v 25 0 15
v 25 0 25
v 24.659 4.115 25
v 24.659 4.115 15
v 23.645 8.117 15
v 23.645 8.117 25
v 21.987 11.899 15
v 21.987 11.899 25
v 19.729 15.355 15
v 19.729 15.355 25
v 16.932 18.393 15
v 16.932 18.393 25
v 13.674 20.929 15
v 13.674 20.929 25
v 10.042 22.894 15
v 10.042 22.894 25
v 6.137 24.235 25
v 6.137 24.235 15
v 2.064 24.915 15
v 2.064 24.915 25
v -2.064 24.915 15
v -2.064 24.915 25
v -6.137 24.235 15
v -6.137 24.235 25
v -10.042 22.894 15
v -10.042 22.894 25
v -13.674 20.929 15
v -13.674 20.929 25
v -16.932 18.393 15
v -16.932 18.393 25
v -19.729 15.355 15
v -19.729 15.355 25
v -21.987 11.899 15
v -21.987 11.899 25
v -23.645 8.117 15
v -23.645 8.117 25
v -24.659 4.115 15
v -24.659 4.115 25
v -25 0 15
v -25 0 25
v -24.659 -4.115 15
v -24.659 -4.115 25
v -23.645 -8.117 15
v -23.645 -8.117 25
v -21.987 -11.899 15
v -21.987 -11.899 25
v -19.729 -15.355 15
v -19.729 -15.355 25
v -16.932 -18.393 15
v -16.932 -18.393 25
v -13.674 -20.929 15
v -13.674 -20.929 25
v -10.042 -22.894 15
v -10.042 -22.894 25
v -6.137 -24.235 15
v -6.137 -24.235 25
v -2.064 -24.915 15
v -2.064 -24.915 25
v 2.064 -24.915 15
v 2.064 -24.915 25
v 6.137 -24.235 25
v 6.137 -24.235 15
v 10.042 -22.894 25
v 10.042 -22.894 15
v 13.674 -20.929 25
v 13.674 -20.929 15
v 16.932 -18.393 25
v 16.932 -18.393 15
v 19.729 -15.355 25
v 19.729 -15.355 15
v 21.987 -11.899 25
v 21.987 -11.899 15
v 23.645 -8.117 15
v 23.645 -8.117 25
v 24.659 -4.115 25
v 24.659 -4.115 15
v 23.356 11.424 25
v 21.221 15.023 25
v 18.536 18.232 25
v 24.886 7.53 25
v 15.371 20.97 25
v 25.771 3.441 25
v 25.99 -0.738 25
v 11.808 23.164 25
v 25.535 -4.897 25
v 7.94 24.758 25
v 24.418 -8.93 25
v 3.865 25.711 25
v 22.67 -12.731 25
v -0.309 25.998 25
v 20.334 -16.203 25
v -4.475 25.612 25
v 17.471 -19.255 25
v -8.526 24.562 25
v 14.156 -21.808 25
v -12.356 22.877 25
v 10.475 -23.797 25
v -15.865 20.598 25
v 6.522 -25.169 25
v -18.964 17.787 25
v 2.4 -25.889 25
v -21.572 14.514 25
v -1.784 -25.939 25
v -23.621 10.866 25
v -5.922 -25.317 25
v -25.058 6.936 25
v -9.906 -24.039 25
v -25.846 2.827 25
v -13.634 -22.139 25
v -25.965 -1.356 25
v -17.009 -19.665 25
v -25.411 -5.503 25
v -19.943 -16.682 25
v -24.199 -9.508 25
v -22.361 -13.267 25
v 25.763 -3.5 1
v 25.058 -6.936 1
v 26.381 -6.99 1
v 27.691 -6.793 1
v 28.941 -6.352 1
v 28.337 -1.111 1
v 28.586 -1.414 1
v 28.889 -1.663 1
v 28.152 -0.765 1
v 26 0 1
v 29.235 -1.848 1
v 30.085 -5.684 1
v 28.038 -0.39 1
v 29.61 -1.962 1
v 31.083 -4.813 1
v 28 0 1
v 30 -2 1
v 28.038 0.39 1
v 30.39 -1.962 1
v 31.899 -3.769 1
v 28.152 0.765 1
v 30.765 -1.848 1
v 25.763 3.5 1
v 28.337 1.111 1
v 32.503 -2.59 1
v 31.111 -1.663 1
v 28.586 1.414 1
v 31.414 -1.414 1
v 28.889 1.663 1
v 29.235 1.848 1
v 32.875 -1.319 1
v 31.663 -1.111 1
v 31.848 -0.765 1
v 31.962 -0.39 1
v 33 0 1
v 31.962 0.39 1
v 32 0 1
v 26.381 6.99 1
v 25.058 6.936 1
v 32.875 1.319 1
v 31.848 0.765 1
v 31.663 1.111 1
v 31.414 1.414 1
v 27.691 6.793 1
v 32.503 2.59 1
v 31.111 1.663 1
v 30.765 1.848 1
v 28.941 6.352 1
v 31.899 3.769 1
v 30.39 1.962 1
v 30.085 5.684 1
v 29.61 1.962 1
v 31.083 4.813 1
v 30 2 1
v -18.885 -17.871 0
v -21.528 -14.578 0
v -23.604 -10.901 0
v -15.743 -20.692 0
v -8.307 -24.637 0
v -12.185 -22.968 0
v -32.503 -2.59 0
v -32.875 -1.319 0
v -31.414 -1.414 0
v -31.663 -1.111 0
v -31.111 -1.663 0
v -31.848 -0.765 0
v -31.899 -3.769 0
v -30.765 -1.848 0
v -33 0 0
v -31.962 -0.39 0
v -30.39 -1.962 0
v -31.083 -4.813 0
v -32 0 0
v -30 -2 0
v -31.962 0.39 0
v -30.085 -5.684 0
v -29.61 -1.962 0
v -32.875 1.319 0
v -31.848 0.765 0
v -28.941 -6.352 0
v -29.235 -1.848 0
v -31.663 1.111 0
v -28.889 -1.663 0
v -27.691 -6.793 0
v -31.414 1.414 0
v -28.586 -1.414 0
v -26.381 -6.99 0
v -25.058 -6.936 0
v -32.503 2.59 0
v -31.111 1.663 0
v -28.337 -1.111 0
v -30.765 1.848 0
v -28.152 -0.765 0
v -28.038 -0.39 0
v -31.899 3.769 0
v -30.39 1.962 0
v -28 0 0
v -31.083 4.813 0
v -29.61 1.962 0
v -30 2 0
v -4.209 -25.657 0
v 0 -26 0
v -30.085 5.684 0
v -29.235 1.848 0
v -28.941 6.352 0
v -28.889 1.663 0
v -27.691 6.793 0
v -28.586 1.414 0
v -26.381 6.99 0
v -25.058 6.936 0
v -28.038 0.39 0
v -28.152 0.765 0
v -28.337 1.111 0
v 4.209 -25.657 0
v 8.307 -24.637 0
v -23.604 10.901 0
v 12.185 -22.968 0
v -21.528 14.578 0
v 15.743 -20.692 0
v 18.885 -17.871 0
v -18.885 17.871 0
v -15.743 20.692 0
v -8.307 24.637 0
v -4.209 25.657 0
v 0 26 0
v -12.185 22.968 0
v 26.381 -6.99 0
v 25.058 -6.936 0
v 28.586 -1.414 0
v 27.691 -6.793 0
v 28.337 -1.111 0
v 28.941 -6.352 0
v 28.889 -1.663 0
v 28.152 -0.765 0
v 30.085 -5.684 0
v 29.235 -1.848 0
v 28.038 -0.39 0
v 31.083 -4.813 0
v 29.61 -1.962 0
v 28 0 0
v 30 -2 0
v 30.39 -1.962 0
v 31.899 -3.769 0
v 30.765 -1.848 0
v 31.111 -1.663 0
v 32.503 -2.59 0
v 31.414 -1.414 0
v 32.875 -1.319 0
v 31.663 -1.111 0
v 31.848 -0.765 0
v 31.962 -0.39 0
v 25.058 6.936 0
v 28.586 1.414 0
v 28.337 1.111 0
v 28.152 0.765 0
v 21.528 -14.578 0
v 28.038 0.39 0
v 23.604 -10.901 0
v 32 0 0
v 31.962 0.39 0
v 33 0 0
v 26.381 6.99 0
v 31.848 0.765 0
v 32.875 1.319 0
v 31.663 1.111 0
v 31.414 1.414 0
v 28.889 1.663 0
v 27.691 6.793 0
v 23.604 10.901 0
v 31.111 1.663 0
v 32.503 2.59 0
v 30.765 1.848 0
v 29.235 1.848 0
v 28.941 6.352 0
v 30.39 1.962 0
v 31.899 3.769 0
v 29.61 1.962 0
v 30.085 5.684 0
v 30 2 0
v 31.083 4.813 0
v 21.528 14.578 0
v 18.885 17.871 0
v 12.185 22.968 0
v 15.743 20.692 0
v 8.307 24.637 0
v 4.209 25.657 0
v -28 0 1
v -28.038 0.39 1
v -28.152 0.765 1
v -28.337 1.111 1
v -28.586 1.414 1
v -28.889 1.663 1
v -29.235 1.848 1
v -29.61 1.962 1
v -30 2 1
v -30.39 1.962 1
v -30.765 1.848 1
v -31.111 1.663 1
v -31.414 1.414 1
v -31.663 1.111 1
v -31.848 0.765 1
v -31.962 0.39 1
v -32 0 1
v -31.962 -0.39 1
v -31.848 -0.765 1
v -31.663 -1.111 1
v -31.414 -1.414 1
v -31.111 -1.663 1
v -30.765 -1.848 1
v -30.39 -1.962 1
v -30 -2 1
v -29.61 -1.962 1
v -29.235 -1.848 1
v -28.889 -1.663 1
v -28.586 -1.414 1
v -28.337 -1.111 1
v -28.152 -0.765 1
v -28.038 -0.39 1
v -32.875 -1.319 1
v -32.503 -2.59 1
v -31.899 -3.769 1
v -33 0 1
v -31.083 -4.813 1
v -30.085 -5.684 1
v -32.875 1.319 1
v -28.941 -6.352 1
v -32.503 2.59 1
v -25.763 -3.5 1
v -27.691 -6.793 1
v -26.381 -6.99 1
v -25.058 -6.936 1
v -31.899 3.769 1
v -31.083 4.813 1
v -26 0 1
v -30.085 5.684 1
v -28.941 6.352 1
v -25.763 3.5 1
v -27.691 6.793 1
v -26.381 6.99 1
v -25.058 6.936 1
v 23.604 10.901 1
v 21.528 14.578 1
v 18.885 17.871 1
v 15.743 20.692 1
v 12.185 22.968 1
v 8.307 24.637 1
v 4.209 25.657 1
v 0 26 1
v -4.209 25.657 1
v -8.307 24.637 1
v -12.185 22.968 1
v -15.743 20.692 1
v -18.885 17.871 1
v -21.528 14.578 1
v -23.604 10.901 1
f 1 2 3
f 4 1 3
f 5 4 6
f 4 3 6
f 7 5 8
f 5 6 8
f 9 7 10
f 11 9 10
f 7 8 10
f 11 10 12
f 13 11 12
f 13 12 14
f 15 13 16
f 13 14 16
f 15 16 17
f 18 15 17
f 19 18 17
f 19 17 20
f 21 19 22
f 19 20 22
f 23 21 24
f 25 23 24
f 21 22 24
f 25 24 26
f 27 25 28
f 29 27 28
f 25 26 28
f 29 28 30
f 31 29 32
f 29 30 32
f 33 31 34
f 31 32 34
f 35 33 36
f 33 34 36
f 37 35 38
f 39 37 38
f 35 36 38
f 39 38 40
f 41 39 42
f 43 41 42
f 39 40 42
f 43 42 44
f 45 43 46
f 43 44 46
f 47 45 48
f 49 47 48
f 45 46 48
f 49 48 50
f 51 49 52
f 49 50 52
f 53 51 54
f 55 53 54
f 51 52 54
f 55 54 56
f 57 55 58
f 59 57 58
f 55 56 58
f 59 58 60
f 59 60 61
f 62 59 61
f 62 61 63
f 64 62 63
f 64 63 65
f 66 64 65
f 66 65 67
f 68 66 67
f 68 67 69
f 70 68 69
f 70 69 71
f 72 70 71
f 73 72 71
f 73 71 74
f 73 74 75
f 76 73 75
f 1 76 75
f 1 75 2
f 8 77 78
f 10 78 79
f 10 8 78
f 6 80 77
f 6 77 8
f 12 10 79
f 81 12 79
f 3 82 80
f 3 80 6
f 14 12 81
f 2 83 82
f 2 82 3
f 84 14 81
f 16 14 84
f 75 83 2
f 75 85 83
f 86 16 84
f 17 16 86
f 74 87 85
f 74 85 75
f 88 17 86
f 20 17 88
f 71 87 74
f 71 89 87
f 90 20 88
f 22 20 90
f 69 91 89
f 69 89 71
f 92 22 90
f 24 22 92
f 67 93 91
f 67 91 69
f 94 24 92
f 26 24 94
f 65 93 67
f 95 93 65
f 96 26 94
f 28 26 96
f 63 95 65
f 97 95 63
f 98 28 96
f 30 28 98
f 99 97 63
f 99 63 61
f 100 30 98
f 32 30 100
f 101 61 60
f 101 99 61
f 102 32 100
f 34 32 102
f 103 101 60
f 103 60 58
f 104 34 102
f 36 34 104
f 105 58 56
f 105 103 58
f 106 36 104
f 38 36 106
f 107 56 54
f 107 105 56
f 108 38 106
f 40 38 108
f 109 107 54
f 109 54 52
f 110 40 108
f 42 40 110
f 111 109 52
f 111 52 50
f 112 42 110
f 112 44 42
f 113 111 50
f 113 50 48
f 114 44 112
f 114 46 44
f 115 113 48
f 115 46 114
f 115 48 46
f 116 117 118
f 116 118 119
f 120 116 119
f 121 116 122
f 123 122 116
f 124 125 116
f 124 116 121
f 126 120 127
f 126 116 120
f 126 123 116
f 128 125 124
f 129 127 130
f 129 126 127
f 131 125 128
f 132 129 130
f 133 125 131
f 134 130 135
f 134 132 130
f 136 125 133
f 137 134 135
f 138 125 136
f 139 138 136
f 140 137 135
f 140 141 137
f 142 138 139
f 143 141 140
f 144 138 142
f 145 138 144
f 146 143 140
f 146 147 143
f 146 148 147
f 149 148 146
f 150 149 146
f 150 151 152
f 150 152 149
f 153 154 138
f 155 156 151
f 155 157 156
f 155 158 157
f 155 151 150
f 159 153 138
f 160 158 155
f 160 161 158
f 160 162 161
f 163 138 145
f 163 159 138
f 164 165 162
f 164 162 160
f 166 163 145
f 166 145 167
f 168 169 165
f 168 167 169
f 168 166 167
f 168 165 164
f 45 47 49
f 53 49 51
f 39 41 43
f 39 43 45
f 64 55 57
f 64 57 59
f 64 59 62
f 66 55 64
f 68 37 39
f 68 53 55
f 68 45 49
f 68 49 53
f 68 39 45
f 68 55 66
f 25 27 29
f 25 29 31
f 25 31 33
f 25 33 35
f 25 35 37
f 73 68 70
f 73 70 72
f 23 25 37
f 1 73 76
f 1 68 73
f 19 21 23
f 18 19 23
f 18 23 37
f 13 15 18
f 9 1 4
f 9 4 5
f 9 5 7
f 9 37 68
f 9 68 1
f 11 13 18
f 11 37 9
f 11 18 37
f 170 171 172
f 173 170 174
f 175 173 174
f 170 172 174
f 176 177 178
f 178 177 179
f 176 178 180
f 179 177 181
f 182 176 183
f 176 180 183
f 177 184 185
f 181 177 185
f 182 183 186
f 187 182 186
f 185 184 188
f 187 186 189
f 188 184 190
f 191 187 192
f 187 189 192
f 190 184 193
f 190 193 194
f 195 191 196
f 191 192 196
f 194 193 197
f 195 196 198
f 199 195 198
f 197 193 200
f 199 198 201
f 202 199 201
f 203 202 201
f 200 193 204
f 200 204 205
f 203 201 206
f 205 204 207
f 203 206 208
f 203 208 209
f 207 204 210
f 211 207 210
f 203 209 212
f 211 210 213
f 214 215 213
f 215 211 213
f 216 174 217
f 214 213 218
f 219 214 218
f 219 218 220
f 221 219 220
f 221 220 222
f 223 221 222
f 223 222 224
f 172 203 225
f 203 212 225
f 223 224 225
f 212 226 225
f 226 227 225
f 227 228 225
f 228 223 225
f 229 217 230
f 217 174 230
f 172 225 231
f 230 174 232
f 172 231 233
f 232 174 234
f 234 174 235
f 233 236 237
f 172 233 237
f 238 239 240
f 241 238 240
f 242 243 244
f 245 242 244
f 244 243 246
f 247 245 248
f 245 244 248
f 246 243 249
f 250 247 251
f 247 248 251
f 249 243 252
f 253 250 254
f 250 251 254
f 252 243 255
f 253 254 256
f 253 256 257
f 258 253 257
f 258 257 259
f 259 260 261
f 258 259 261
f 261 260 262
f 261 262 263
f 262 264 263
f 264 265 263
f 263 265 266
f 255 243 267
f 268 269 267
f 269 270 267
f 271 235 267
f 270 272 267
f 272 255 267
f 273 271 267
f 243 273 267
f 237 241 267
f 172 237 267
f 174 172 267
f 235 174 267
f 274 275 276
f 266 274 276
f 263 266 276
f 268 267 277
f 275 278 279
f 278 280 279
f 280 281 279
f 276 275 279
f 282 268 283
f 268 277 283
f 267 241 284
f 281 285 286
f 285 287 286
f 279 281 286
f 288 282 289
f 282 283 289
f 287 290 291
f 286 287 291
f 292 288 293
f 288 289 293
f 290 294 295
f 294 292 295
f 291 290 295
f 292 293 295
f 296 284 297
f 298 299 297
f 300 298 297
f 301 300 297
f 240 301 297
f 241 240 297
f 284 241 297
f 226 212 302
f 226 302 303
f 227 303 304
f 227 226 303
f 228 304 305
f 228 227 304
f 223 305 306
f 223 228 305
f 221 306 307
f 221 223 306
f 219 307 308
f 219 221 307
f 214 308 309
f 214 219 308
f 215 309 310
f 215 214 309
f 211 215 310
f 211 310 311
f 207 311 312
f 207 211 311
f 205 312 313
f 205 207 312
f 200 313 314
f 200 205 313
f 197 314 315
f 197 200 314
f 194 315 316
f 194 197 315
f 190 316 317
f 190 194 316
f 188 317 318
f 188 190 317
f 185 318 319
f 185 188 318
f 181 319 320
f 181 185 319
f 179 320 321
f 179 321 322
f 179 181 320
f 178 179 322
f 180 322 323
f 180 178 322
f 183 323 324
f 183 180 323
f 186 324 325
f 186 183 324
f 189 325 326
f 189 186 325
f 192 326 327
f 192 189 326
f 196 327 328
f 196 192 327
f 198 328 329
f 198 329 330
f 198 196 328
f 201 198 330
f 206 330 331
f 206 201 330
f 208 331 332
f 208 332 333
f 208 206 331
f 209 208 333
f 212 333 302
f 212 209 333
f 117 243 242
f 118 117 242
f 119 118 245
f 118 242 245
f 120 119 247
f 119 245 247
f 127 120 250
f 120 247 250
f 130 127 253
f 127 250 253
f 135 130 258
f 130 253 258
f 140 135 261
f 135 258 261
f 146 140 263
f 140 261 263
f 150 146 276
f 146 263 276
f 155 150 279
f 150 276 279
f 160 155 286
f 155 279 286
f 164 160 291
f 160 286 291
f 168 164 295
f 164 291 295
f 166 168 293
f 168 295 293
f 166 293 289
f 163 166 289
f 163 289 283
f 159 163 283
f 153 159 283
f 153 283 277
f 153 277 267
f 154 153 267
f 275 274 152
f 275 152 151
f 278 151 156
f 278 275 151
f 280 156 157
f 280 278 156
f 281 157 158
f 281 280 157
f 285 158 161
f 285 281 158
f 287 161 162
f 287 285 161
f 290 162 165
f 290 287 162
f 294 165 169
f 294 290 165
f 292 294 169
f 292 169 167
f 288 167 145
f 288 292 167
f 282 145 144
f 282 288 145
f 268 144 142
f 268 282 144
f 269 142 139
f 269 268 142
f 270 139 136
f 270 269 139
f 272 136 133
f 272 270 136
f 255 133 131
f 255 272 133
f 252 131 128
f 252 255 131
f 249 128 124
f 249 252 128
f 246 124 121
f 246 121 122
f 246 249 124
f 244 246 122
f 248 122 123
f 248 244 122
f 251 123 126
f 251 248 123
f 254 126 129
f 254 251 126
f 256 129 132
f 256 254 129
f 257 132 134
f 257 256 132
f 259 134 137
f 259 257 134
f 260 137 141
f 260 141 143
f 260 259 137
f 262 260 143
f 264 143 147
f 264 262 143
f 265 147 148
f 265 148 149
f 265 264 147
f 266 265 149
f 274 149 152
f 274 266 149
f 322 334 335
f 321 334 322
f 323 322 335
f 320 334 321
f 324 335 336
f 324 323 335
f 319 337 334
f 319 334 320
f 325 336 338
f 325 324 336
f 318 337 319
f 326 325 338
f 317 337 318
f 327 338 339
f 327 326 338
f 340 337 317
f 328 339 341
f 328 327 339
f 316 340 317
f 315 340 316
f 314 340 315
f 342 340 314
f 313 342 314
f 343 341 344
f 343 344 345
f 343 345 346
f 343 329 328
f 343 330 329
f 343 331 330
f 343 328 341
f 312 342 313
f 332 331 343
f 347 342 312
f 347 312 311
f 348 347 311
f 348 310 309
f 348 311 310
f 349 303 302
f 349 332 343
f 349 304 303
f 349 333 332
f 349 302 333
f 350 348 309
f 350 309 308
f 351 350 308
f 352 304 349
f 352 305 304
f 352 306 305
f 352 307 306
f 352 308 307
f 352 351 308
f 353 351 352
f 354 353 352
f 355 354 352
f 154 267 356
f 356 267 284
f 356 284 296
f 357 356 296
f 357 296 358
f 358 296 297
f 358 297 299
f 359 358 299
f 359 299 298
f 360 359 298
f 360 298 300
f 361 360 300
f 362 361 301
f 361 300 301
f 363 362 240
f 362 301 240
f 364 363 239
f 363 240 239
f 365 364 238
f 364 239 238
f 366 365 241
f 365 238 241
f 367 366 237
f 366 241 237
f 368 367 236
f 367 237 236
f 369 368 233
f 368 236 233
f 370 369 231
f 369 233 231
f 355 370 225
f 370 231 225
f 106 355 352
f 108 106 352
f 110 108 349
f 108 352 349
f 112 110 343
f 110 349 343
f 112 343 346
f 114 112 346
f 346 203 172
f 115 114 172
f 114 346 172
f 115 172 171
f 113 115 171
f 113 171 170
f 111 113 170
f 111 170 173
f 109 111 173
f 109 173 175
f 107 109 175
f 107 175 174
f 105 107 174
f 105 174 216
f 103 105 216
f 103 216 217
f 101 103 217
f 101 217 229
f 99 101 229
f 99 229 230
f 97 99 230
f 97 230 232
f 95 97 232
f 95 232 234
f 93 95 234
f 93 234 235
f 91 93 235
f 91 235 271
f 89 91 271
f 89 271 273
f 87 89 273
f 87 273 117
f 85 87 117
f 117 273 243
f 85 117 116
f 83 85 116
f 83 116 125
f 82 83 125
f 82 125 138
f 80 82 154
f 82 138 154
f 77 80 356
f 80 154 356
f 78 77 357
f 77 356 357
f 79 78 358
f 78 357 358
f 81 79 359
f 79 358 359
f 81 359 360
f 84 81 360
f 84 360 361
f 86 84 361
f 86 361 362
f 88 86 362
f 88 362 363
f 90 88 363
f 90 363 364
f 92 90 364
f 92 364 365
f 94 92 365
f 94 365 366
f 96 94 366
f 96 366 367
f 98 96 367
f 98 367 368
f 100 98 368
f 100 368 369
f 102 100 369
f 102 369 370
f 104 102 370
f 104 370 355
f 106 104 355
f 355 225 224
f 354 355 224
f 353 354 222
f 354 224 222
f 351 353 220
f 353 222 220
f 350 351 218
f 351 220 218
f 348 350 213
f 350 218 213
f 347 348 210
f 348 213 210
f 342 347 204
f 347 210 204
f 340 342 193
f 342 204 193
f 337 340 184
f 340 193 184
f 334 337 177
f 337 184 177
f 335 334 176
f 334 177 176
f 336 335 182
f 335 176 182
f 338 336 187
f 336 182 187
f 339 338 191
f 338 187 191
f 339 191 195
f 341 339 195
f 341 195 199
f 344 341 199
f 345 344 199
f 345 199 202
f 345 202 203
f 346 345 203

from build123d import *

# Parameters (mm, degrees)
ESQUISSE1_R             = 2
BOSS_EXTRU_1_DEPTH      = 1
BOSS_EXTRU_2_DEPTH      = 25
ESQUISSE2_R             = 25
ENL_V_MAT_EXTRU_1_DEPTH = 10


with BuildPart() as part:
    # Esquisse1 → Boss.-Extru.1 (new body)
    with BuildSketch(Plane.XY):
        with BuildLine():
            ThreePointArc((-25.057692308, -6.936285477), (0, -26), (25.057692308, -6.936285477))
            ThreePointArc((25.057692308, -6.936285477), (33, 0), (25.057692308, 6.936285477))
            ThreePointArc((25.057692308, 6.936285477), (0, 26), (-25.057692308, 6.936285477))
            ThreePointArc((-25.057692308, 6.936285477), (-33, 0), (-25.057692308, -6.936285477))
        make_face()
        with Locations((30, 0)):
            Circle(ESQUISSE1_R, mode=Mode.SUBTRACT)
        with Locations((-30, 0)):
            Circle(ESQUISSE1_R, mode=Mode.SUBTRACT)
    extrude(amount=BOSS_EXTRU_1_DEPTH)

    # Esquisse1<3> → Boss.-Extru.2 (add)
    with BuildSketch(Plane.XY):
        with BuildLine():
            ThreePointArc((25.057692308, -6.936285477), (25.763346056, -3.5), (26, 0))
            ThreePointArc((26, 0), (25.763346056, 3.5), (25.057692308, 6.936285477))
            ThreePointArc((25.057692308, 6.936285477), (0, 26), (-25.057692308, 6.936285477))
            ThreePointArc((-25.057692308, 6.936285477), (-26, 0), (-25.057692308, -6.936285477))
            ThreePointArc((-25.057692308, -6.936285477), (0, -26), (25.057692308, -6.936285477))
        make_face()
    extrude(amount=BOSS_EXTRU_2_DEPTH)

    # Esquisse2 → Enlèv. mat.-Extru.1 (cut)
    with BuildSketch(Plane.XY.offset(25)):
        Circle(ESQUISSE2_R)
    extrude(amount=-ENL_V_MAT_EXTRU_1_DEPTH, mode=Mode.SUBTRACT)


solid = part.part
